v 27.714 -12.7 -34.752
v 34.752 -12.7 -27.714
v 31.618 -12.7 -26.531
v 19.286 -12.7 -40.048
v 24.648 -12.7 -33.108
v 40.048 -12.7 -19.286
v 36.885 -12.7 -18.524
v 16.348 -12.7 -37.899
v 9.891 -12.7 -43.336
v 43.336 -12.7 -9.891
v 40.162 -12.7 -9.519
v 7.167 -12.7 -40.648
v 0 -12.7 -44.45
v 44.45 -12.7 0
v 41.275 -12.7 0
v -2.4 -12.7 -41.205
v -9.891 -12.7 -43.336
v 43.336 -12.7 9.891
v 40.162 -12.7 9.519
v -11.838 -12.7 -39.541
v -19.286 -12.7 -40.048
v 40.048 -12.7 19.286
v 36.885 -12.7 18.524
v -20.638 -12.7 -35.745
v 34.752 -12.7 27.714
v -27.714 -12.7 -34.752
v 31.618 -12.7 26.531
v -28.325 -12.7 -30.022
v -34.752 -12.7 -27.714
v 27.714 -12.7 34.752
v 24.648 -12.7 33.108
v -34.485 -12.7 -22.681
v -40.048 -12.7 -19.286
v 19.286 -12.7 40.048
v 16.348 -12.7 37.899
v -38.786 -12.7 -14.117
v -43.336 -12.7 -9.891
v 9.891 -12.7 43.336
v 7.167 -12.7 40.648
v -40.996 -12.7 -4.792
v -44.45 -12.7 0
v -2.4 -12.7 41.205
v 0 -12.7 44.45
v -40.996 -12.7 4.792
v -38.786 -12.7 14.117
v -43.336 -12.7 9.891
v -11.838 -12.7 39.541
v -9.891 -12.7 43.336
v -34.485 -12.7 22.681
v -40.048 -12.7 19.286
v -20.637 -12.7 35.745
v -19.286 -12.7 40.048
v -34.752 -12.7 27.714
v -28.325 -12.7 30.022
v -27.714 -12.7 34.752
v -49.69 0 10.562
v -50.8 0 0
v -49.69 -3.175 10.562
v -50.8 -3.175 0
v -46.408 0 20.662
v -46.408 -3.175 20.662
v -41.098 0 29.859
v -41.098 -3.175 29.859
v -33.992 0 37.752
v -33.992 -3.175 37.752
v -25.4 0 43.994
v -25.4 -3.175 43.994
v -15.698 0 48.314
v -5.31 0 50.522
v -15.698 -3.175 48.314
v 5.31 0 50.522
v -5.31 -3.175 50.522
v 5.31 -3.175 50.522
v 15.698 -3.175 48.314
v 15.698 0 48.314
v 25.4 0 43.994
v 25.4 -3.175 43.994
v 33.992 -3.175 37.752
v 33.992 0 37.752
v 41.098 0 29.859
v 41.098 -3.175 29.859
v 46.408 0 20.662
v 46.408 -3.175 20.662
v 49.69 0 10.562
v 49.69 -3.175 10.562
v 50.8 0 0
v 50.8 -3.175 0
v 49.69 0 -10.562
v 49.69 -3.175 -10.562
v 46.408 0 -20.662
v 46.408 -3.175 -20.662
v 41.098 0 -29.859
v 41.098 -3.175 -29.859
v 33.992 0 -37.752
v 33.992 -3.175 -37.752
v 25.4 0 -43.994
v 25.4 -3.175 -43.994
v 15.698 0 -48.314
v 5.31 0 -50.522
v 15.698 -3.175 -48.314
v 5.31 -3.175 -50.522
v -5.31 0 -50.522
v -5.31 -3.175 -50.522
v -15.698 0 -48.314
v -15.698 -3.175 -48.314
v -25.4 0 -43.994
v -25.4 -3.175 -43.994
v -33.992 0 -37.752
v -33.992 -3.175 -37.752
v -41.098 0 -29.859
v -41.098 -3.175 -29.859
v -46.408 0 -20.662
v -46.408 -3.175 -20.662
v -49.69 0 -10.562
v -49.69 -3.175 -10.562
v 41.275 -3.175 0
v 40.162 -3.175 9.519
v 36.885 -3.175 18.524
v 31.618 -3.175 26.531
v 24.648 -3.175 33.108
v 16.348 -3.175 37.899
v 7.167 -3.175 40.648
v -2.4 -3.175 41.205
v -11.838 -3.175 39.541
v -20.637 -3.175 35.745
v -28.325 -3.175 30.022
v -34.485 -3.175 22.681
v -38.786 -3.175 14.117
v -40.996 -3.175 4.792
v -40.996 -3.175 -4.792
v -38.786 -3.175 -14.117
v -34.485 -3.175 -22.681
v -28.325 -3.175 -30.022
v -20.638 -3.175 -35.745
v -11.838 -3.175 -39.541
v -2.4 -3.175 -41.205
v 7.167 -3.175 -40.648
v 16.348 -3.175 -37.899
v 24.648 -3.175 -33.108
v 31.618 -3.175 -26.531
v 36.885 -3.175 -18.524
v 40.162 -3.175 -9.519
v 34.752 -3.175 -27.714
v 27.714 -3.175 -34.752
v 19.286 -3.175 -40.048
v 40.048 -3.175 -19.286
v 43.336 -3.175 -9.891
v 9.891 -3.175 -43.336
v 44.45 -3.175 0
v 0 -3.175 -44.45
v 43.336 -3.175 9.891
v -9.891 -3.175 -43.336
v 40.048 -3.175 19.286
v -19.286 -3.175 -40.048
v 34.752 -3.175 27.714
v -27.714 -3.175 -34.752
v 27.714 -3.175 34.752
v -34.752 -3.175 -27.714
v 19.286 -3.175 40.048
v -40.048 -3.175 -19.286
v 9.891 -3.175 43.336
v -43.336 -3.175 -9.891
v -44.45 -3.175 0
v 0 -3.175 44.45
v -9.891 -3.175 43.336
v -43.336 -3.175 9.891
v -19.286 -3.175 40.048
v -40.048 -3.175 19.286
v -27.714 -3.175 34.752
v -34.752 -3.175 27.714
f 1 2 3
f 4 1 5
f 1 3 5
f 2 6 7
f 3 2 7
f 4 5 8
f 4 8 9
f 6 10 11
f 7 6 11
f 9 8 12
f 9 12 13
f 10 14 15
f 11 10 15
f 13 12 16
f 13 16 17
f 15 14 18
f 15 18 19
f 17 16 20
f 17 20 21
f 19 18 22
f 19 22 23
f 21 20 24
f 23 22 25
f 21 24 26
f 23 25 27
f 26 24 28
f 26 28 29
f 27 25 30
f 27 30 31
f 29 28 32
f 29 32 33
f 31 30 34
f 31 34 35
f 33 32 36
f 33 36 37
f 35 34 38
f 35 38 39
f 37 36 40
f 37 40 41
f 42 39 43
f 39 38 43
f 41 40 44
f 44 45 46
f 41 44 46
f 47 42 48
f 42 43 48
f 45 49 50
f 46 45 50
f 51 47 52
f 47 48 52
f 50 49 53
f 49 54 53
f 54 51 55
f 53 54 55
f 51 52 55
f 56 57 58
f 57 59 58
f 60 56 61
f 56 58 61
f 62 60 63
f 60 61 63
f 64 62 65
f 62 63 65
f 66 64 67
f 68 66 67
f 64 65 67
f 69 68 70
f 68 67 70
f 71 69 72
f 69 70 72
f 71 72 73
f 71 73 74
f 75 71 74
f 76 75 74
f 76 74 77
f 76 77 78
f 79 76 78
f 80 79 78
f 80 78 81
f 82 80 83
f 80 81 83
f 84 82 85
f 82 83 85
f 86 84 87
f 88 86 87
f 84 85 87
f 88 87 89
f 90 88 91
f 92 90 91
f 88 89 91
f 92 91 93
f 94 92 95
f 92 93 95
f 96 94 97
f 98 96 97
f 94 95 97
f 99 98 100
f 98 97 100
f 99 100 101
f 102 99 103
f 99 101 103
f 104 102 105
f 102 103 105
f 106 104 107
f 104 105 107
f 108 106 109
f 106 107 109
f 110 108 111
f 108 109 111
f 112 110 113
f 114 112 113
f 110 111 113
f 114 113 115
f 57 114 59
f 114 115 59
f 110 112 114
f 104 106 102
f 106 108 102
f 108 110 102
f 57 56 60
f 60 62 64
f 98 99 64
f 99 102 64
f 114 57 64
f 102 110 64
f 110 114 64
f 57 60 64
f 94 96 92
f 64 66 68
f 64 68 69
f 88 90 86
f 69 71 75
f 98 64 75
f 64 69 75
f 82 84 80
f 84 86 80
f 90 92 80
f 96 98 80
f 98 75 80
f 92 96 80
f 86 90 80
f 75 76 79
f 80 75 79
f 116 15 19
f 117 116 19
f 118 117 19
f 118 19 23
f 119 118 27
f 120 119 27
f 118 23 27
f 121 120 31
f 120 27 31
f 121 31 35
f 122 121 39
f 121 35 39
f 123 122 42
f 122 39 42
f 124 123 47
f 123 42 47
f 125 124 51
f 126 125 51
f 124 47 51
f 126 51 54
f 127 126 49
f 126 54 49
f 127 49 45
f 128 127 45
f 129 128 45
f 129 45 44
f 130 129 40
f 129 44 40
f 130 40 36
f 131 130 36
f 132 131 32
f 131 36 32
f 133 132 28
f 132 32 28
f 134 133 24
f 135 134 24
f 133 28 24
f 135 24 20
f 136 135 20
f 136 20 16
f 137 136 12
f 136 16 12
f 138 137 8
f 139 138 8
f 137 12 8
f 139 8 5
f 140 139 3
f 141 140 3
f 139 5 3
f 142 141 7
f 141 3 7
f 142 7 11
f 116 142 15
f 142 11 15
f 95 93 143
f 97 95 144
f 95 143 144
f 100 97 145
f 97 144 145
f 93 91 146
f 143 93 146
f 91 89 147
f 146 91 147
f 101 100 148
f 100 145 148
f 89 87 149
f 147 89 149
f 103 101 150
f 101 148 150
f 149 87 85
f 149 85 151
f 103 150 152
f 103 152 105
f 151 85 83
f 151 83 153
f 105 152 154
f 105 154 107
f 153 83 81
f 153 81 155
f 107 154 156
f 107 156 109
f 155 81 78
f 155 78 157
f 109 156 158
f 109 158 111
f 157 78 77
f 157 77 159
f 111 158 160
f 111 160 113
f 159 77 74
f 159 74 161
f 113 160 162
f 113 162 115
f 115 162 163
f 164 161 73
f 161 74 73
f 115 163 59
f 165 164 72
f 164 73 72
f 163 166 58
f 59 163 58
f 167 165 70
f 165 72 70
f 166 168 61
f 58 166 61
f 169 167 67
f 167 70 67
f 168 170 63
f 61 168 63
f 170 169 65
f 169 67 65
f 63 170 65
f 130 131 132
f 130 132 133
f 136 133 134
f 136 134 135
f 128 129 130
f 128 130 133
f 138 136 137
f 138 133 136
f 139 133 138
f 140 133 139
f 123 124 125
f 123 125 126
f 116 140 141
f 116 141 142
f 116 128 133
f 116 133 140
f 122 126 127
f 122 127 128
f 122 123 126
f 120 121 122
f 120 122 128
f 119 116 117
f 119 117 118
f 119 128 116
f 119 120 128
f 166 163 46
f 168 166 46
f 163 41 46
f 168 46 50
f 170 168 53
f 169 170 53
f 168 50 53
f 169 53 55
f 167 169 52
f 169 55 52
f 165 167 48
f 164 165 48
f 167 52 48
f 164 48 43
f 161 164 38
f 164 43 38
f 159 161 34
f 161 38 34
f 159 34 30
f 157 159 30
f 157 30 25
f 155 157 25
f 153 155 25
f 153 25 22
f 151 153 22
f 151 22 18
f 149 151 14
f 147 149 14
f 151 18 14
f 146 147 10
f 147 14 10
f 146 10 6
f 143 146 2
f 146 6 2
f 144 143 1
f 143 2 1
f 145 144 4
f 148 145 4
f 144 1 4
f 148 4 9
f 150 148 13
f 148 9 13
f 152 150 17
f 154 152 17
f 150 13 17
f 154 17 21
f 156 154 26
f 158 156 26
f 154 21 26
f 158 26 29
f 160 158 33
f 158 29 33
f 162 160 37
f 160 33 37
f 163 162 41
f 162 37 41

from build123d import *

# Parameters (mm, degrees)
SKETCH2_R          = 41.275
CUT_EXTRUDE1_DEPTH = 9.525


with BuildPart() as part:
    # Sketch1 → Revolve1 (revolve)
    with BuildSketch(Plane.XY):
        Polygon((0, 0), (-50.8, 0), (-50.8, -3.175), (-44.45, -3.175), (-44.45, -12.7), (0, -12.7), align=None)
    revolve(axis=Axis((0, -12.7, 0), (0, 1, 0)))

    # Sketch2 → Cut-Extrude1 (cut)
    with BuildSketch(Plane.XZ.offset(12.7)):
        Circle(SKETCH2_R)
    extrude(amount=-CUT_EXTRUDE1_DEPTH, mode=Mode.SUBTRACT)


solid = part.part
